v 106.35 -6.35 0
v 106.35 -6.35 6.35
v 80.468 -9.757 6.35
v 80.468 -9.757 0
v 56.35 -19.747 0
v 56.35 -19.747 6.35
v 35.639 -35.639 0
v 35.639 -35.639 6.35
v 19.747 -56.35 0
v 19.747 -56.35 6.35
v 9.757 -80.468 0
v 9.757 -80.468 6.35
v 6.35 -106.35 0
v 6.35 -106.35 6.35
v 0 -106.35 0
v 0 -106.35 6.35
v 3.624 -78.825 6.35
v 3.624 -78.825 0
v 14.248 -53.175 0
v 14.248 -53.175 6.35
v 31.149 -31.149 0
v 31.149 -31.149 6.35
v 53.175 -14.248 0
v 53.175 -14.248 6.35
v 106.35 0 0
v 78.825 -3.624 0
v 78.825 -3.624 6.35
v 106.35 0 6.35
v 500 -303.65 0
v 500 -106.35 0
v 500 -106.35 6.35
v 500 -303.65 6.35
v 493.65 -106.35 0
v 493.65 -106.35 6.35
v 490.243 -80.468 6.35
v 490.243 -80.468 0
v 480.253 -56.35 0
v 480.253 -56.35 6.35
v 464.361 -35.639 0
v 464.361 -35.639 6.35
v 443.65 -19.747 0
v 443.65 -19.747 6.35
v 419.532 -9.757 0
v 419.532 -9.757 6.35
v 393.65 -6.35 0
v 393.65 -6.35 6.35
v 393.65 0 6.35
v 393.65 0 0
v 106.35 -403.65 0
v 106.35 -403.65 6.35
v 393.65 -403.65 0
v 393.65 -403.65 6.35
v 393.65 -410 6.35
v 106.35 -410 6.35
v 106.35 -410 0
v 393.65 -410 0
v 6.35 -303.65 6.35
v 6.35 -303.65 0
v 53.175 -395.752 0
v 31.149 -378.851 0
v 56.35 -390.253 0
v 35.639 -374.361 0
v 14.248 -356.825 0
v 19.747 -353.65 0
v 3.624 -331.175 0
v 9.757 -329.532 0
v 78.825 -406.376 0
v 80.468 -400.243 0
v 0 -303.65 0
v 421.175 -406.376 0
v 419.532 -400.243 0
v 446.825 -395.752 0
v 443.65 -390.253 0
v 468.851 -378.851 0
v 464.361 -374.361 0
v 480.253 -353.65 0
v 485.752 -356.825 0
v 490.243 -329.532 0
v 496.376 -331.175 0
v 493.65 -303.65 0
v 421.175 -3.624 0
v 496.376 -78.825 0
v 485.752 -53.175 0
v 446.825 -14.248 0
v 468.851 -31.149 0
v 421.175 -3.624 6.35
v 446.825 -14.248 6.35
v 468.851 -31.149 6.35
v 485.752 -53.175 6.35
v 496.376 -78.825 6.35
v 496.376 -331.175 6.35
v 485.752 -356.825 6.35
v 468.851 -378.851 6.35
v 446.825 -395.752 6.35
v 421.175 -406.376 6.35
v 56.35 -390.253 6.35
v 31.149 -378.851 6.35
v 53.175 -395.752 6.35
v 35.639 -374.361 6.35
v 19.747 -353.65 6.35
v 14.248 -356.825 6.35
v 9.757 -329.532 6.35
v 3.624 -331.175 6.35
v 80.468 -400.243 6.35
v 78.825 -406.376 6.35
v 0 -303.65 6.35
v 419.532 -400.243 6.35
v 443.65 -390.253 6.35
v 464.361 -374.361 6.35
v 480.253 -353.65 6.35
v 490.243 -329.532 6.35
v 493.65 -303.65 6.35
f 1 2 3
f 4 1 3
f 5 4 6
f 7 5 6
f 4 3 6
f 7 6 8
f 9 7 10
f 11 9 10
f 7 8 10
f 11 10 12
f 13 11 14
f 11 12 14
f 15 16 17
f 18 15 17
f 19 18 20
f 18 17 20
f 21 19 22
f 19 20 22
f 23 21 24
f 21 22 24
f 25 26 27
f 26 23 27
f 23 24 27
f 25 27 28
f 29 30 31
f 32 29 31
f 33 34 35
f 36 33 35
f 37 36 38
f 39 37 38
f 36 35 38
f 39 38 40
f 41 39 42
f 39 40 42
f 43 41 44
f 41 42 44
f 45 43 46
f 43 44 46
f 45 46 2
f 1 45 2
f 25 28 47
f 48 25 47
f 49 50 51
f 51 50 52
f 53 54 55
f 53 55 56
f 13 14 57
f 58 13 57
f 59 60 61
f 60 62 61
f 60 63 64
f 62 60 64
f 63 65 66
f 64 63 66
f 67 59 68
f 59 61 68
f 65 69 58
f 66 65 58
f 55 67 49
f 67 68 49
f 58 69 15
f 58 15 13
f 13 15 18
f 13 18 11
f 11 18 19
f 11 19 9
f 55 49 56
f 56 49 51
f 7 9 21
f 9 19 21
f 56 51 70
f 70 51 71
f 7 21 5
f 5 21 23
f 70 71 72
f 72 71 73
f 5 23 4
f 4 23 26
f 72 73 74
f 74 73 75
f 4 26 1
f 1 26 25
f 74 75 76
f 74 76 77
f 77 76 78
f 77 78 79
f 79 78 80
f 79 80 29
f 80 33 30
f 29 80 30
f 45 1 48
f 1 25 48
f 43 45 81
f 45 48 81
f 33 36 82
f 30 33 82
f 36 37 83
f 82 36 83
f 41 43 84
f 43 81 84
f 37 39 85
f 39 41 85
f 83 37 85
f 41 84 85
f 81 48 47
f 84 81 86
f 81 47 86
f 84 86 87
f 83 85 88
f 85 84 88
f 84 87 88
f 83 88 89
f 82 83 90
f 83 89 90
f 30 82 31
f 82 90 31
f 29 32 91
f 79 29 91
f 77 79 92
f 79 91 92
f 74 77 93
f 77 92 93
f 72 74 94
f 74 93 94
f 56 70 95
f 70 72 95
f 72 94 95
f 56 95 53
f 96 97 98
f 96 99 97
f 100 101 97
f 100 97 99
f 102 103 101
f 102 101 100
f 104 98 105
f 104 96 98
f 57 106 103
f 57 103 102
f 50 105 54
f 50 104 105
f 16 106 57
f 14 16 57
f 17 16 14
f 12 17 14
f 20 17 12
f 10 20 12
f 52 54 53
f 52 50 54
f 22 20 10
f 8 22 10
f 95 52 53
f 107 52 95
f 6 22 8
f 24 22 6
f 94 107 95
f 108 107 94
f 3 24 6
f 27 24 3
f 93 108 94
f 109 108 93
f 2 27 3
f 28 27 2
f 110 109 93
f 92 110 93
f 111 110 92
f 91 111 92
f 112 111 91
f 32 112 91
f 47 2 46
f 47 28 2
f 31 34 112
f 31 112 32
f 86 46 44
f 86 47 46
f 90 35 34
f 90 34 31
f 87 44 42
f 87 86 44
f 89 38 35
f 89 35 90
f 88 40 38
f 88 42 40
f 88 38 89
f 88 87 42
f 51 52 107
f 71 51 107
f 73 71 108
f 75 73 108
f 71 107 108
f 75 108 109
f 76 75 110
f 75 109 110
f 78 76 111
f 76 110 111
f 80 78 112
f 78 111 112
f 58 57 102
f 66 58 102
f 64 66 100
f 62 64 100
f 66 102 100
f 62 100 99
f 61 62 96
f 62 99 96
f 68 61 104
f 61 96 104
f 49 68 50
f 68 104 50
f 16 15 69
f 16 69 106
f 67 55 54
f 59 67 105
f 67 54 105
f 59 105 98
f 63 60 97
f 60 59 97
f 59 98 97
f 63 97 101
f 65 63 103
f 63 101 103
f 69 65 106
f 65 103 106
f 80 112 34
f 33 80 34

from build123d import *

# Parameters (mm, degrees)
F0_W     = 500
F0_H     = 6.35
F1_DEPTH = 410
F3_DEPTH = 25
F4_W     = 517.022076
F4_H     = 424.169128
F5_DEPTH = 25


with BuildPart() as f1:
    # F0 (on Front) → F1 (new body)
    with BuildSketch(Plane.XZ):
        with Locations((250, 3.175)):
            Rectangle(F0_W, F0_H)
    extrude(amount=F1_DEPTH)

    # F2 (on face) → F3 (cut)
    with BuildSketch(Plane.XY.offset(6.35)):
        with BuildLine():
            Line((393.65, -6.35), (106.35, -6.35))
            ThreePointArc((106.35, -6.35), (35.639322, -35.639322), (6.35, -106.35))
            Line((6.35, -106.35), (6.35, -303.65))
            ThreePointArc((6.35, -303.65), (35.639322, -374.360678), (106.35, -403.65))
            Line((106.35, -403.65), (393.65, -403.65))
            ThreePointArc((393.65, -403.65), (464.360678, -374.360678), (493.65, -303.65))
            Line((493.65, -303.65), (493.65, -106.35))
            ThreePointArc((493.65, -106.35), (464.360678, -35.639322), (393.65, -6.35))
        make_face()
    extrude(amount=-F3_DEPTH, mode=Mode.SUBTRACT)

    # F4 (on face) → F5 (cut)
    with BuildSketch(Plane.XY.offset(6.35)):
        with Locations((249.736218, -205.263791)):
            Rectangle(F4_W, F4_H)
        with BuildLine():
            ThreePointArc((0, -106.35), (31.149194, -31.149194), (106.35, 0))
            Line((106.35, 0), (393.65, 0))
            ThreePointArc((393.65, 0), (468.850806, -31.149194), (500, -106.35))
            Line((500, -106.35), (500, -303.65))
            ThreePointArc((500, -303.65), (468.850806, -378.850806), (393.65, -410))
            Line((393.65, -410), (106.35, -410))
            ThreePointArc((106.35, -410), (31.149194, -378.850806), (0, -303.65))
            Line((0, -303.65), (0, -106.35))
        make_face(mode=Mode.SUBTRACT)
    extrude(amount=-F5_DEPTH, mode=Mode.SUBTRACT)


solid = f1.part
